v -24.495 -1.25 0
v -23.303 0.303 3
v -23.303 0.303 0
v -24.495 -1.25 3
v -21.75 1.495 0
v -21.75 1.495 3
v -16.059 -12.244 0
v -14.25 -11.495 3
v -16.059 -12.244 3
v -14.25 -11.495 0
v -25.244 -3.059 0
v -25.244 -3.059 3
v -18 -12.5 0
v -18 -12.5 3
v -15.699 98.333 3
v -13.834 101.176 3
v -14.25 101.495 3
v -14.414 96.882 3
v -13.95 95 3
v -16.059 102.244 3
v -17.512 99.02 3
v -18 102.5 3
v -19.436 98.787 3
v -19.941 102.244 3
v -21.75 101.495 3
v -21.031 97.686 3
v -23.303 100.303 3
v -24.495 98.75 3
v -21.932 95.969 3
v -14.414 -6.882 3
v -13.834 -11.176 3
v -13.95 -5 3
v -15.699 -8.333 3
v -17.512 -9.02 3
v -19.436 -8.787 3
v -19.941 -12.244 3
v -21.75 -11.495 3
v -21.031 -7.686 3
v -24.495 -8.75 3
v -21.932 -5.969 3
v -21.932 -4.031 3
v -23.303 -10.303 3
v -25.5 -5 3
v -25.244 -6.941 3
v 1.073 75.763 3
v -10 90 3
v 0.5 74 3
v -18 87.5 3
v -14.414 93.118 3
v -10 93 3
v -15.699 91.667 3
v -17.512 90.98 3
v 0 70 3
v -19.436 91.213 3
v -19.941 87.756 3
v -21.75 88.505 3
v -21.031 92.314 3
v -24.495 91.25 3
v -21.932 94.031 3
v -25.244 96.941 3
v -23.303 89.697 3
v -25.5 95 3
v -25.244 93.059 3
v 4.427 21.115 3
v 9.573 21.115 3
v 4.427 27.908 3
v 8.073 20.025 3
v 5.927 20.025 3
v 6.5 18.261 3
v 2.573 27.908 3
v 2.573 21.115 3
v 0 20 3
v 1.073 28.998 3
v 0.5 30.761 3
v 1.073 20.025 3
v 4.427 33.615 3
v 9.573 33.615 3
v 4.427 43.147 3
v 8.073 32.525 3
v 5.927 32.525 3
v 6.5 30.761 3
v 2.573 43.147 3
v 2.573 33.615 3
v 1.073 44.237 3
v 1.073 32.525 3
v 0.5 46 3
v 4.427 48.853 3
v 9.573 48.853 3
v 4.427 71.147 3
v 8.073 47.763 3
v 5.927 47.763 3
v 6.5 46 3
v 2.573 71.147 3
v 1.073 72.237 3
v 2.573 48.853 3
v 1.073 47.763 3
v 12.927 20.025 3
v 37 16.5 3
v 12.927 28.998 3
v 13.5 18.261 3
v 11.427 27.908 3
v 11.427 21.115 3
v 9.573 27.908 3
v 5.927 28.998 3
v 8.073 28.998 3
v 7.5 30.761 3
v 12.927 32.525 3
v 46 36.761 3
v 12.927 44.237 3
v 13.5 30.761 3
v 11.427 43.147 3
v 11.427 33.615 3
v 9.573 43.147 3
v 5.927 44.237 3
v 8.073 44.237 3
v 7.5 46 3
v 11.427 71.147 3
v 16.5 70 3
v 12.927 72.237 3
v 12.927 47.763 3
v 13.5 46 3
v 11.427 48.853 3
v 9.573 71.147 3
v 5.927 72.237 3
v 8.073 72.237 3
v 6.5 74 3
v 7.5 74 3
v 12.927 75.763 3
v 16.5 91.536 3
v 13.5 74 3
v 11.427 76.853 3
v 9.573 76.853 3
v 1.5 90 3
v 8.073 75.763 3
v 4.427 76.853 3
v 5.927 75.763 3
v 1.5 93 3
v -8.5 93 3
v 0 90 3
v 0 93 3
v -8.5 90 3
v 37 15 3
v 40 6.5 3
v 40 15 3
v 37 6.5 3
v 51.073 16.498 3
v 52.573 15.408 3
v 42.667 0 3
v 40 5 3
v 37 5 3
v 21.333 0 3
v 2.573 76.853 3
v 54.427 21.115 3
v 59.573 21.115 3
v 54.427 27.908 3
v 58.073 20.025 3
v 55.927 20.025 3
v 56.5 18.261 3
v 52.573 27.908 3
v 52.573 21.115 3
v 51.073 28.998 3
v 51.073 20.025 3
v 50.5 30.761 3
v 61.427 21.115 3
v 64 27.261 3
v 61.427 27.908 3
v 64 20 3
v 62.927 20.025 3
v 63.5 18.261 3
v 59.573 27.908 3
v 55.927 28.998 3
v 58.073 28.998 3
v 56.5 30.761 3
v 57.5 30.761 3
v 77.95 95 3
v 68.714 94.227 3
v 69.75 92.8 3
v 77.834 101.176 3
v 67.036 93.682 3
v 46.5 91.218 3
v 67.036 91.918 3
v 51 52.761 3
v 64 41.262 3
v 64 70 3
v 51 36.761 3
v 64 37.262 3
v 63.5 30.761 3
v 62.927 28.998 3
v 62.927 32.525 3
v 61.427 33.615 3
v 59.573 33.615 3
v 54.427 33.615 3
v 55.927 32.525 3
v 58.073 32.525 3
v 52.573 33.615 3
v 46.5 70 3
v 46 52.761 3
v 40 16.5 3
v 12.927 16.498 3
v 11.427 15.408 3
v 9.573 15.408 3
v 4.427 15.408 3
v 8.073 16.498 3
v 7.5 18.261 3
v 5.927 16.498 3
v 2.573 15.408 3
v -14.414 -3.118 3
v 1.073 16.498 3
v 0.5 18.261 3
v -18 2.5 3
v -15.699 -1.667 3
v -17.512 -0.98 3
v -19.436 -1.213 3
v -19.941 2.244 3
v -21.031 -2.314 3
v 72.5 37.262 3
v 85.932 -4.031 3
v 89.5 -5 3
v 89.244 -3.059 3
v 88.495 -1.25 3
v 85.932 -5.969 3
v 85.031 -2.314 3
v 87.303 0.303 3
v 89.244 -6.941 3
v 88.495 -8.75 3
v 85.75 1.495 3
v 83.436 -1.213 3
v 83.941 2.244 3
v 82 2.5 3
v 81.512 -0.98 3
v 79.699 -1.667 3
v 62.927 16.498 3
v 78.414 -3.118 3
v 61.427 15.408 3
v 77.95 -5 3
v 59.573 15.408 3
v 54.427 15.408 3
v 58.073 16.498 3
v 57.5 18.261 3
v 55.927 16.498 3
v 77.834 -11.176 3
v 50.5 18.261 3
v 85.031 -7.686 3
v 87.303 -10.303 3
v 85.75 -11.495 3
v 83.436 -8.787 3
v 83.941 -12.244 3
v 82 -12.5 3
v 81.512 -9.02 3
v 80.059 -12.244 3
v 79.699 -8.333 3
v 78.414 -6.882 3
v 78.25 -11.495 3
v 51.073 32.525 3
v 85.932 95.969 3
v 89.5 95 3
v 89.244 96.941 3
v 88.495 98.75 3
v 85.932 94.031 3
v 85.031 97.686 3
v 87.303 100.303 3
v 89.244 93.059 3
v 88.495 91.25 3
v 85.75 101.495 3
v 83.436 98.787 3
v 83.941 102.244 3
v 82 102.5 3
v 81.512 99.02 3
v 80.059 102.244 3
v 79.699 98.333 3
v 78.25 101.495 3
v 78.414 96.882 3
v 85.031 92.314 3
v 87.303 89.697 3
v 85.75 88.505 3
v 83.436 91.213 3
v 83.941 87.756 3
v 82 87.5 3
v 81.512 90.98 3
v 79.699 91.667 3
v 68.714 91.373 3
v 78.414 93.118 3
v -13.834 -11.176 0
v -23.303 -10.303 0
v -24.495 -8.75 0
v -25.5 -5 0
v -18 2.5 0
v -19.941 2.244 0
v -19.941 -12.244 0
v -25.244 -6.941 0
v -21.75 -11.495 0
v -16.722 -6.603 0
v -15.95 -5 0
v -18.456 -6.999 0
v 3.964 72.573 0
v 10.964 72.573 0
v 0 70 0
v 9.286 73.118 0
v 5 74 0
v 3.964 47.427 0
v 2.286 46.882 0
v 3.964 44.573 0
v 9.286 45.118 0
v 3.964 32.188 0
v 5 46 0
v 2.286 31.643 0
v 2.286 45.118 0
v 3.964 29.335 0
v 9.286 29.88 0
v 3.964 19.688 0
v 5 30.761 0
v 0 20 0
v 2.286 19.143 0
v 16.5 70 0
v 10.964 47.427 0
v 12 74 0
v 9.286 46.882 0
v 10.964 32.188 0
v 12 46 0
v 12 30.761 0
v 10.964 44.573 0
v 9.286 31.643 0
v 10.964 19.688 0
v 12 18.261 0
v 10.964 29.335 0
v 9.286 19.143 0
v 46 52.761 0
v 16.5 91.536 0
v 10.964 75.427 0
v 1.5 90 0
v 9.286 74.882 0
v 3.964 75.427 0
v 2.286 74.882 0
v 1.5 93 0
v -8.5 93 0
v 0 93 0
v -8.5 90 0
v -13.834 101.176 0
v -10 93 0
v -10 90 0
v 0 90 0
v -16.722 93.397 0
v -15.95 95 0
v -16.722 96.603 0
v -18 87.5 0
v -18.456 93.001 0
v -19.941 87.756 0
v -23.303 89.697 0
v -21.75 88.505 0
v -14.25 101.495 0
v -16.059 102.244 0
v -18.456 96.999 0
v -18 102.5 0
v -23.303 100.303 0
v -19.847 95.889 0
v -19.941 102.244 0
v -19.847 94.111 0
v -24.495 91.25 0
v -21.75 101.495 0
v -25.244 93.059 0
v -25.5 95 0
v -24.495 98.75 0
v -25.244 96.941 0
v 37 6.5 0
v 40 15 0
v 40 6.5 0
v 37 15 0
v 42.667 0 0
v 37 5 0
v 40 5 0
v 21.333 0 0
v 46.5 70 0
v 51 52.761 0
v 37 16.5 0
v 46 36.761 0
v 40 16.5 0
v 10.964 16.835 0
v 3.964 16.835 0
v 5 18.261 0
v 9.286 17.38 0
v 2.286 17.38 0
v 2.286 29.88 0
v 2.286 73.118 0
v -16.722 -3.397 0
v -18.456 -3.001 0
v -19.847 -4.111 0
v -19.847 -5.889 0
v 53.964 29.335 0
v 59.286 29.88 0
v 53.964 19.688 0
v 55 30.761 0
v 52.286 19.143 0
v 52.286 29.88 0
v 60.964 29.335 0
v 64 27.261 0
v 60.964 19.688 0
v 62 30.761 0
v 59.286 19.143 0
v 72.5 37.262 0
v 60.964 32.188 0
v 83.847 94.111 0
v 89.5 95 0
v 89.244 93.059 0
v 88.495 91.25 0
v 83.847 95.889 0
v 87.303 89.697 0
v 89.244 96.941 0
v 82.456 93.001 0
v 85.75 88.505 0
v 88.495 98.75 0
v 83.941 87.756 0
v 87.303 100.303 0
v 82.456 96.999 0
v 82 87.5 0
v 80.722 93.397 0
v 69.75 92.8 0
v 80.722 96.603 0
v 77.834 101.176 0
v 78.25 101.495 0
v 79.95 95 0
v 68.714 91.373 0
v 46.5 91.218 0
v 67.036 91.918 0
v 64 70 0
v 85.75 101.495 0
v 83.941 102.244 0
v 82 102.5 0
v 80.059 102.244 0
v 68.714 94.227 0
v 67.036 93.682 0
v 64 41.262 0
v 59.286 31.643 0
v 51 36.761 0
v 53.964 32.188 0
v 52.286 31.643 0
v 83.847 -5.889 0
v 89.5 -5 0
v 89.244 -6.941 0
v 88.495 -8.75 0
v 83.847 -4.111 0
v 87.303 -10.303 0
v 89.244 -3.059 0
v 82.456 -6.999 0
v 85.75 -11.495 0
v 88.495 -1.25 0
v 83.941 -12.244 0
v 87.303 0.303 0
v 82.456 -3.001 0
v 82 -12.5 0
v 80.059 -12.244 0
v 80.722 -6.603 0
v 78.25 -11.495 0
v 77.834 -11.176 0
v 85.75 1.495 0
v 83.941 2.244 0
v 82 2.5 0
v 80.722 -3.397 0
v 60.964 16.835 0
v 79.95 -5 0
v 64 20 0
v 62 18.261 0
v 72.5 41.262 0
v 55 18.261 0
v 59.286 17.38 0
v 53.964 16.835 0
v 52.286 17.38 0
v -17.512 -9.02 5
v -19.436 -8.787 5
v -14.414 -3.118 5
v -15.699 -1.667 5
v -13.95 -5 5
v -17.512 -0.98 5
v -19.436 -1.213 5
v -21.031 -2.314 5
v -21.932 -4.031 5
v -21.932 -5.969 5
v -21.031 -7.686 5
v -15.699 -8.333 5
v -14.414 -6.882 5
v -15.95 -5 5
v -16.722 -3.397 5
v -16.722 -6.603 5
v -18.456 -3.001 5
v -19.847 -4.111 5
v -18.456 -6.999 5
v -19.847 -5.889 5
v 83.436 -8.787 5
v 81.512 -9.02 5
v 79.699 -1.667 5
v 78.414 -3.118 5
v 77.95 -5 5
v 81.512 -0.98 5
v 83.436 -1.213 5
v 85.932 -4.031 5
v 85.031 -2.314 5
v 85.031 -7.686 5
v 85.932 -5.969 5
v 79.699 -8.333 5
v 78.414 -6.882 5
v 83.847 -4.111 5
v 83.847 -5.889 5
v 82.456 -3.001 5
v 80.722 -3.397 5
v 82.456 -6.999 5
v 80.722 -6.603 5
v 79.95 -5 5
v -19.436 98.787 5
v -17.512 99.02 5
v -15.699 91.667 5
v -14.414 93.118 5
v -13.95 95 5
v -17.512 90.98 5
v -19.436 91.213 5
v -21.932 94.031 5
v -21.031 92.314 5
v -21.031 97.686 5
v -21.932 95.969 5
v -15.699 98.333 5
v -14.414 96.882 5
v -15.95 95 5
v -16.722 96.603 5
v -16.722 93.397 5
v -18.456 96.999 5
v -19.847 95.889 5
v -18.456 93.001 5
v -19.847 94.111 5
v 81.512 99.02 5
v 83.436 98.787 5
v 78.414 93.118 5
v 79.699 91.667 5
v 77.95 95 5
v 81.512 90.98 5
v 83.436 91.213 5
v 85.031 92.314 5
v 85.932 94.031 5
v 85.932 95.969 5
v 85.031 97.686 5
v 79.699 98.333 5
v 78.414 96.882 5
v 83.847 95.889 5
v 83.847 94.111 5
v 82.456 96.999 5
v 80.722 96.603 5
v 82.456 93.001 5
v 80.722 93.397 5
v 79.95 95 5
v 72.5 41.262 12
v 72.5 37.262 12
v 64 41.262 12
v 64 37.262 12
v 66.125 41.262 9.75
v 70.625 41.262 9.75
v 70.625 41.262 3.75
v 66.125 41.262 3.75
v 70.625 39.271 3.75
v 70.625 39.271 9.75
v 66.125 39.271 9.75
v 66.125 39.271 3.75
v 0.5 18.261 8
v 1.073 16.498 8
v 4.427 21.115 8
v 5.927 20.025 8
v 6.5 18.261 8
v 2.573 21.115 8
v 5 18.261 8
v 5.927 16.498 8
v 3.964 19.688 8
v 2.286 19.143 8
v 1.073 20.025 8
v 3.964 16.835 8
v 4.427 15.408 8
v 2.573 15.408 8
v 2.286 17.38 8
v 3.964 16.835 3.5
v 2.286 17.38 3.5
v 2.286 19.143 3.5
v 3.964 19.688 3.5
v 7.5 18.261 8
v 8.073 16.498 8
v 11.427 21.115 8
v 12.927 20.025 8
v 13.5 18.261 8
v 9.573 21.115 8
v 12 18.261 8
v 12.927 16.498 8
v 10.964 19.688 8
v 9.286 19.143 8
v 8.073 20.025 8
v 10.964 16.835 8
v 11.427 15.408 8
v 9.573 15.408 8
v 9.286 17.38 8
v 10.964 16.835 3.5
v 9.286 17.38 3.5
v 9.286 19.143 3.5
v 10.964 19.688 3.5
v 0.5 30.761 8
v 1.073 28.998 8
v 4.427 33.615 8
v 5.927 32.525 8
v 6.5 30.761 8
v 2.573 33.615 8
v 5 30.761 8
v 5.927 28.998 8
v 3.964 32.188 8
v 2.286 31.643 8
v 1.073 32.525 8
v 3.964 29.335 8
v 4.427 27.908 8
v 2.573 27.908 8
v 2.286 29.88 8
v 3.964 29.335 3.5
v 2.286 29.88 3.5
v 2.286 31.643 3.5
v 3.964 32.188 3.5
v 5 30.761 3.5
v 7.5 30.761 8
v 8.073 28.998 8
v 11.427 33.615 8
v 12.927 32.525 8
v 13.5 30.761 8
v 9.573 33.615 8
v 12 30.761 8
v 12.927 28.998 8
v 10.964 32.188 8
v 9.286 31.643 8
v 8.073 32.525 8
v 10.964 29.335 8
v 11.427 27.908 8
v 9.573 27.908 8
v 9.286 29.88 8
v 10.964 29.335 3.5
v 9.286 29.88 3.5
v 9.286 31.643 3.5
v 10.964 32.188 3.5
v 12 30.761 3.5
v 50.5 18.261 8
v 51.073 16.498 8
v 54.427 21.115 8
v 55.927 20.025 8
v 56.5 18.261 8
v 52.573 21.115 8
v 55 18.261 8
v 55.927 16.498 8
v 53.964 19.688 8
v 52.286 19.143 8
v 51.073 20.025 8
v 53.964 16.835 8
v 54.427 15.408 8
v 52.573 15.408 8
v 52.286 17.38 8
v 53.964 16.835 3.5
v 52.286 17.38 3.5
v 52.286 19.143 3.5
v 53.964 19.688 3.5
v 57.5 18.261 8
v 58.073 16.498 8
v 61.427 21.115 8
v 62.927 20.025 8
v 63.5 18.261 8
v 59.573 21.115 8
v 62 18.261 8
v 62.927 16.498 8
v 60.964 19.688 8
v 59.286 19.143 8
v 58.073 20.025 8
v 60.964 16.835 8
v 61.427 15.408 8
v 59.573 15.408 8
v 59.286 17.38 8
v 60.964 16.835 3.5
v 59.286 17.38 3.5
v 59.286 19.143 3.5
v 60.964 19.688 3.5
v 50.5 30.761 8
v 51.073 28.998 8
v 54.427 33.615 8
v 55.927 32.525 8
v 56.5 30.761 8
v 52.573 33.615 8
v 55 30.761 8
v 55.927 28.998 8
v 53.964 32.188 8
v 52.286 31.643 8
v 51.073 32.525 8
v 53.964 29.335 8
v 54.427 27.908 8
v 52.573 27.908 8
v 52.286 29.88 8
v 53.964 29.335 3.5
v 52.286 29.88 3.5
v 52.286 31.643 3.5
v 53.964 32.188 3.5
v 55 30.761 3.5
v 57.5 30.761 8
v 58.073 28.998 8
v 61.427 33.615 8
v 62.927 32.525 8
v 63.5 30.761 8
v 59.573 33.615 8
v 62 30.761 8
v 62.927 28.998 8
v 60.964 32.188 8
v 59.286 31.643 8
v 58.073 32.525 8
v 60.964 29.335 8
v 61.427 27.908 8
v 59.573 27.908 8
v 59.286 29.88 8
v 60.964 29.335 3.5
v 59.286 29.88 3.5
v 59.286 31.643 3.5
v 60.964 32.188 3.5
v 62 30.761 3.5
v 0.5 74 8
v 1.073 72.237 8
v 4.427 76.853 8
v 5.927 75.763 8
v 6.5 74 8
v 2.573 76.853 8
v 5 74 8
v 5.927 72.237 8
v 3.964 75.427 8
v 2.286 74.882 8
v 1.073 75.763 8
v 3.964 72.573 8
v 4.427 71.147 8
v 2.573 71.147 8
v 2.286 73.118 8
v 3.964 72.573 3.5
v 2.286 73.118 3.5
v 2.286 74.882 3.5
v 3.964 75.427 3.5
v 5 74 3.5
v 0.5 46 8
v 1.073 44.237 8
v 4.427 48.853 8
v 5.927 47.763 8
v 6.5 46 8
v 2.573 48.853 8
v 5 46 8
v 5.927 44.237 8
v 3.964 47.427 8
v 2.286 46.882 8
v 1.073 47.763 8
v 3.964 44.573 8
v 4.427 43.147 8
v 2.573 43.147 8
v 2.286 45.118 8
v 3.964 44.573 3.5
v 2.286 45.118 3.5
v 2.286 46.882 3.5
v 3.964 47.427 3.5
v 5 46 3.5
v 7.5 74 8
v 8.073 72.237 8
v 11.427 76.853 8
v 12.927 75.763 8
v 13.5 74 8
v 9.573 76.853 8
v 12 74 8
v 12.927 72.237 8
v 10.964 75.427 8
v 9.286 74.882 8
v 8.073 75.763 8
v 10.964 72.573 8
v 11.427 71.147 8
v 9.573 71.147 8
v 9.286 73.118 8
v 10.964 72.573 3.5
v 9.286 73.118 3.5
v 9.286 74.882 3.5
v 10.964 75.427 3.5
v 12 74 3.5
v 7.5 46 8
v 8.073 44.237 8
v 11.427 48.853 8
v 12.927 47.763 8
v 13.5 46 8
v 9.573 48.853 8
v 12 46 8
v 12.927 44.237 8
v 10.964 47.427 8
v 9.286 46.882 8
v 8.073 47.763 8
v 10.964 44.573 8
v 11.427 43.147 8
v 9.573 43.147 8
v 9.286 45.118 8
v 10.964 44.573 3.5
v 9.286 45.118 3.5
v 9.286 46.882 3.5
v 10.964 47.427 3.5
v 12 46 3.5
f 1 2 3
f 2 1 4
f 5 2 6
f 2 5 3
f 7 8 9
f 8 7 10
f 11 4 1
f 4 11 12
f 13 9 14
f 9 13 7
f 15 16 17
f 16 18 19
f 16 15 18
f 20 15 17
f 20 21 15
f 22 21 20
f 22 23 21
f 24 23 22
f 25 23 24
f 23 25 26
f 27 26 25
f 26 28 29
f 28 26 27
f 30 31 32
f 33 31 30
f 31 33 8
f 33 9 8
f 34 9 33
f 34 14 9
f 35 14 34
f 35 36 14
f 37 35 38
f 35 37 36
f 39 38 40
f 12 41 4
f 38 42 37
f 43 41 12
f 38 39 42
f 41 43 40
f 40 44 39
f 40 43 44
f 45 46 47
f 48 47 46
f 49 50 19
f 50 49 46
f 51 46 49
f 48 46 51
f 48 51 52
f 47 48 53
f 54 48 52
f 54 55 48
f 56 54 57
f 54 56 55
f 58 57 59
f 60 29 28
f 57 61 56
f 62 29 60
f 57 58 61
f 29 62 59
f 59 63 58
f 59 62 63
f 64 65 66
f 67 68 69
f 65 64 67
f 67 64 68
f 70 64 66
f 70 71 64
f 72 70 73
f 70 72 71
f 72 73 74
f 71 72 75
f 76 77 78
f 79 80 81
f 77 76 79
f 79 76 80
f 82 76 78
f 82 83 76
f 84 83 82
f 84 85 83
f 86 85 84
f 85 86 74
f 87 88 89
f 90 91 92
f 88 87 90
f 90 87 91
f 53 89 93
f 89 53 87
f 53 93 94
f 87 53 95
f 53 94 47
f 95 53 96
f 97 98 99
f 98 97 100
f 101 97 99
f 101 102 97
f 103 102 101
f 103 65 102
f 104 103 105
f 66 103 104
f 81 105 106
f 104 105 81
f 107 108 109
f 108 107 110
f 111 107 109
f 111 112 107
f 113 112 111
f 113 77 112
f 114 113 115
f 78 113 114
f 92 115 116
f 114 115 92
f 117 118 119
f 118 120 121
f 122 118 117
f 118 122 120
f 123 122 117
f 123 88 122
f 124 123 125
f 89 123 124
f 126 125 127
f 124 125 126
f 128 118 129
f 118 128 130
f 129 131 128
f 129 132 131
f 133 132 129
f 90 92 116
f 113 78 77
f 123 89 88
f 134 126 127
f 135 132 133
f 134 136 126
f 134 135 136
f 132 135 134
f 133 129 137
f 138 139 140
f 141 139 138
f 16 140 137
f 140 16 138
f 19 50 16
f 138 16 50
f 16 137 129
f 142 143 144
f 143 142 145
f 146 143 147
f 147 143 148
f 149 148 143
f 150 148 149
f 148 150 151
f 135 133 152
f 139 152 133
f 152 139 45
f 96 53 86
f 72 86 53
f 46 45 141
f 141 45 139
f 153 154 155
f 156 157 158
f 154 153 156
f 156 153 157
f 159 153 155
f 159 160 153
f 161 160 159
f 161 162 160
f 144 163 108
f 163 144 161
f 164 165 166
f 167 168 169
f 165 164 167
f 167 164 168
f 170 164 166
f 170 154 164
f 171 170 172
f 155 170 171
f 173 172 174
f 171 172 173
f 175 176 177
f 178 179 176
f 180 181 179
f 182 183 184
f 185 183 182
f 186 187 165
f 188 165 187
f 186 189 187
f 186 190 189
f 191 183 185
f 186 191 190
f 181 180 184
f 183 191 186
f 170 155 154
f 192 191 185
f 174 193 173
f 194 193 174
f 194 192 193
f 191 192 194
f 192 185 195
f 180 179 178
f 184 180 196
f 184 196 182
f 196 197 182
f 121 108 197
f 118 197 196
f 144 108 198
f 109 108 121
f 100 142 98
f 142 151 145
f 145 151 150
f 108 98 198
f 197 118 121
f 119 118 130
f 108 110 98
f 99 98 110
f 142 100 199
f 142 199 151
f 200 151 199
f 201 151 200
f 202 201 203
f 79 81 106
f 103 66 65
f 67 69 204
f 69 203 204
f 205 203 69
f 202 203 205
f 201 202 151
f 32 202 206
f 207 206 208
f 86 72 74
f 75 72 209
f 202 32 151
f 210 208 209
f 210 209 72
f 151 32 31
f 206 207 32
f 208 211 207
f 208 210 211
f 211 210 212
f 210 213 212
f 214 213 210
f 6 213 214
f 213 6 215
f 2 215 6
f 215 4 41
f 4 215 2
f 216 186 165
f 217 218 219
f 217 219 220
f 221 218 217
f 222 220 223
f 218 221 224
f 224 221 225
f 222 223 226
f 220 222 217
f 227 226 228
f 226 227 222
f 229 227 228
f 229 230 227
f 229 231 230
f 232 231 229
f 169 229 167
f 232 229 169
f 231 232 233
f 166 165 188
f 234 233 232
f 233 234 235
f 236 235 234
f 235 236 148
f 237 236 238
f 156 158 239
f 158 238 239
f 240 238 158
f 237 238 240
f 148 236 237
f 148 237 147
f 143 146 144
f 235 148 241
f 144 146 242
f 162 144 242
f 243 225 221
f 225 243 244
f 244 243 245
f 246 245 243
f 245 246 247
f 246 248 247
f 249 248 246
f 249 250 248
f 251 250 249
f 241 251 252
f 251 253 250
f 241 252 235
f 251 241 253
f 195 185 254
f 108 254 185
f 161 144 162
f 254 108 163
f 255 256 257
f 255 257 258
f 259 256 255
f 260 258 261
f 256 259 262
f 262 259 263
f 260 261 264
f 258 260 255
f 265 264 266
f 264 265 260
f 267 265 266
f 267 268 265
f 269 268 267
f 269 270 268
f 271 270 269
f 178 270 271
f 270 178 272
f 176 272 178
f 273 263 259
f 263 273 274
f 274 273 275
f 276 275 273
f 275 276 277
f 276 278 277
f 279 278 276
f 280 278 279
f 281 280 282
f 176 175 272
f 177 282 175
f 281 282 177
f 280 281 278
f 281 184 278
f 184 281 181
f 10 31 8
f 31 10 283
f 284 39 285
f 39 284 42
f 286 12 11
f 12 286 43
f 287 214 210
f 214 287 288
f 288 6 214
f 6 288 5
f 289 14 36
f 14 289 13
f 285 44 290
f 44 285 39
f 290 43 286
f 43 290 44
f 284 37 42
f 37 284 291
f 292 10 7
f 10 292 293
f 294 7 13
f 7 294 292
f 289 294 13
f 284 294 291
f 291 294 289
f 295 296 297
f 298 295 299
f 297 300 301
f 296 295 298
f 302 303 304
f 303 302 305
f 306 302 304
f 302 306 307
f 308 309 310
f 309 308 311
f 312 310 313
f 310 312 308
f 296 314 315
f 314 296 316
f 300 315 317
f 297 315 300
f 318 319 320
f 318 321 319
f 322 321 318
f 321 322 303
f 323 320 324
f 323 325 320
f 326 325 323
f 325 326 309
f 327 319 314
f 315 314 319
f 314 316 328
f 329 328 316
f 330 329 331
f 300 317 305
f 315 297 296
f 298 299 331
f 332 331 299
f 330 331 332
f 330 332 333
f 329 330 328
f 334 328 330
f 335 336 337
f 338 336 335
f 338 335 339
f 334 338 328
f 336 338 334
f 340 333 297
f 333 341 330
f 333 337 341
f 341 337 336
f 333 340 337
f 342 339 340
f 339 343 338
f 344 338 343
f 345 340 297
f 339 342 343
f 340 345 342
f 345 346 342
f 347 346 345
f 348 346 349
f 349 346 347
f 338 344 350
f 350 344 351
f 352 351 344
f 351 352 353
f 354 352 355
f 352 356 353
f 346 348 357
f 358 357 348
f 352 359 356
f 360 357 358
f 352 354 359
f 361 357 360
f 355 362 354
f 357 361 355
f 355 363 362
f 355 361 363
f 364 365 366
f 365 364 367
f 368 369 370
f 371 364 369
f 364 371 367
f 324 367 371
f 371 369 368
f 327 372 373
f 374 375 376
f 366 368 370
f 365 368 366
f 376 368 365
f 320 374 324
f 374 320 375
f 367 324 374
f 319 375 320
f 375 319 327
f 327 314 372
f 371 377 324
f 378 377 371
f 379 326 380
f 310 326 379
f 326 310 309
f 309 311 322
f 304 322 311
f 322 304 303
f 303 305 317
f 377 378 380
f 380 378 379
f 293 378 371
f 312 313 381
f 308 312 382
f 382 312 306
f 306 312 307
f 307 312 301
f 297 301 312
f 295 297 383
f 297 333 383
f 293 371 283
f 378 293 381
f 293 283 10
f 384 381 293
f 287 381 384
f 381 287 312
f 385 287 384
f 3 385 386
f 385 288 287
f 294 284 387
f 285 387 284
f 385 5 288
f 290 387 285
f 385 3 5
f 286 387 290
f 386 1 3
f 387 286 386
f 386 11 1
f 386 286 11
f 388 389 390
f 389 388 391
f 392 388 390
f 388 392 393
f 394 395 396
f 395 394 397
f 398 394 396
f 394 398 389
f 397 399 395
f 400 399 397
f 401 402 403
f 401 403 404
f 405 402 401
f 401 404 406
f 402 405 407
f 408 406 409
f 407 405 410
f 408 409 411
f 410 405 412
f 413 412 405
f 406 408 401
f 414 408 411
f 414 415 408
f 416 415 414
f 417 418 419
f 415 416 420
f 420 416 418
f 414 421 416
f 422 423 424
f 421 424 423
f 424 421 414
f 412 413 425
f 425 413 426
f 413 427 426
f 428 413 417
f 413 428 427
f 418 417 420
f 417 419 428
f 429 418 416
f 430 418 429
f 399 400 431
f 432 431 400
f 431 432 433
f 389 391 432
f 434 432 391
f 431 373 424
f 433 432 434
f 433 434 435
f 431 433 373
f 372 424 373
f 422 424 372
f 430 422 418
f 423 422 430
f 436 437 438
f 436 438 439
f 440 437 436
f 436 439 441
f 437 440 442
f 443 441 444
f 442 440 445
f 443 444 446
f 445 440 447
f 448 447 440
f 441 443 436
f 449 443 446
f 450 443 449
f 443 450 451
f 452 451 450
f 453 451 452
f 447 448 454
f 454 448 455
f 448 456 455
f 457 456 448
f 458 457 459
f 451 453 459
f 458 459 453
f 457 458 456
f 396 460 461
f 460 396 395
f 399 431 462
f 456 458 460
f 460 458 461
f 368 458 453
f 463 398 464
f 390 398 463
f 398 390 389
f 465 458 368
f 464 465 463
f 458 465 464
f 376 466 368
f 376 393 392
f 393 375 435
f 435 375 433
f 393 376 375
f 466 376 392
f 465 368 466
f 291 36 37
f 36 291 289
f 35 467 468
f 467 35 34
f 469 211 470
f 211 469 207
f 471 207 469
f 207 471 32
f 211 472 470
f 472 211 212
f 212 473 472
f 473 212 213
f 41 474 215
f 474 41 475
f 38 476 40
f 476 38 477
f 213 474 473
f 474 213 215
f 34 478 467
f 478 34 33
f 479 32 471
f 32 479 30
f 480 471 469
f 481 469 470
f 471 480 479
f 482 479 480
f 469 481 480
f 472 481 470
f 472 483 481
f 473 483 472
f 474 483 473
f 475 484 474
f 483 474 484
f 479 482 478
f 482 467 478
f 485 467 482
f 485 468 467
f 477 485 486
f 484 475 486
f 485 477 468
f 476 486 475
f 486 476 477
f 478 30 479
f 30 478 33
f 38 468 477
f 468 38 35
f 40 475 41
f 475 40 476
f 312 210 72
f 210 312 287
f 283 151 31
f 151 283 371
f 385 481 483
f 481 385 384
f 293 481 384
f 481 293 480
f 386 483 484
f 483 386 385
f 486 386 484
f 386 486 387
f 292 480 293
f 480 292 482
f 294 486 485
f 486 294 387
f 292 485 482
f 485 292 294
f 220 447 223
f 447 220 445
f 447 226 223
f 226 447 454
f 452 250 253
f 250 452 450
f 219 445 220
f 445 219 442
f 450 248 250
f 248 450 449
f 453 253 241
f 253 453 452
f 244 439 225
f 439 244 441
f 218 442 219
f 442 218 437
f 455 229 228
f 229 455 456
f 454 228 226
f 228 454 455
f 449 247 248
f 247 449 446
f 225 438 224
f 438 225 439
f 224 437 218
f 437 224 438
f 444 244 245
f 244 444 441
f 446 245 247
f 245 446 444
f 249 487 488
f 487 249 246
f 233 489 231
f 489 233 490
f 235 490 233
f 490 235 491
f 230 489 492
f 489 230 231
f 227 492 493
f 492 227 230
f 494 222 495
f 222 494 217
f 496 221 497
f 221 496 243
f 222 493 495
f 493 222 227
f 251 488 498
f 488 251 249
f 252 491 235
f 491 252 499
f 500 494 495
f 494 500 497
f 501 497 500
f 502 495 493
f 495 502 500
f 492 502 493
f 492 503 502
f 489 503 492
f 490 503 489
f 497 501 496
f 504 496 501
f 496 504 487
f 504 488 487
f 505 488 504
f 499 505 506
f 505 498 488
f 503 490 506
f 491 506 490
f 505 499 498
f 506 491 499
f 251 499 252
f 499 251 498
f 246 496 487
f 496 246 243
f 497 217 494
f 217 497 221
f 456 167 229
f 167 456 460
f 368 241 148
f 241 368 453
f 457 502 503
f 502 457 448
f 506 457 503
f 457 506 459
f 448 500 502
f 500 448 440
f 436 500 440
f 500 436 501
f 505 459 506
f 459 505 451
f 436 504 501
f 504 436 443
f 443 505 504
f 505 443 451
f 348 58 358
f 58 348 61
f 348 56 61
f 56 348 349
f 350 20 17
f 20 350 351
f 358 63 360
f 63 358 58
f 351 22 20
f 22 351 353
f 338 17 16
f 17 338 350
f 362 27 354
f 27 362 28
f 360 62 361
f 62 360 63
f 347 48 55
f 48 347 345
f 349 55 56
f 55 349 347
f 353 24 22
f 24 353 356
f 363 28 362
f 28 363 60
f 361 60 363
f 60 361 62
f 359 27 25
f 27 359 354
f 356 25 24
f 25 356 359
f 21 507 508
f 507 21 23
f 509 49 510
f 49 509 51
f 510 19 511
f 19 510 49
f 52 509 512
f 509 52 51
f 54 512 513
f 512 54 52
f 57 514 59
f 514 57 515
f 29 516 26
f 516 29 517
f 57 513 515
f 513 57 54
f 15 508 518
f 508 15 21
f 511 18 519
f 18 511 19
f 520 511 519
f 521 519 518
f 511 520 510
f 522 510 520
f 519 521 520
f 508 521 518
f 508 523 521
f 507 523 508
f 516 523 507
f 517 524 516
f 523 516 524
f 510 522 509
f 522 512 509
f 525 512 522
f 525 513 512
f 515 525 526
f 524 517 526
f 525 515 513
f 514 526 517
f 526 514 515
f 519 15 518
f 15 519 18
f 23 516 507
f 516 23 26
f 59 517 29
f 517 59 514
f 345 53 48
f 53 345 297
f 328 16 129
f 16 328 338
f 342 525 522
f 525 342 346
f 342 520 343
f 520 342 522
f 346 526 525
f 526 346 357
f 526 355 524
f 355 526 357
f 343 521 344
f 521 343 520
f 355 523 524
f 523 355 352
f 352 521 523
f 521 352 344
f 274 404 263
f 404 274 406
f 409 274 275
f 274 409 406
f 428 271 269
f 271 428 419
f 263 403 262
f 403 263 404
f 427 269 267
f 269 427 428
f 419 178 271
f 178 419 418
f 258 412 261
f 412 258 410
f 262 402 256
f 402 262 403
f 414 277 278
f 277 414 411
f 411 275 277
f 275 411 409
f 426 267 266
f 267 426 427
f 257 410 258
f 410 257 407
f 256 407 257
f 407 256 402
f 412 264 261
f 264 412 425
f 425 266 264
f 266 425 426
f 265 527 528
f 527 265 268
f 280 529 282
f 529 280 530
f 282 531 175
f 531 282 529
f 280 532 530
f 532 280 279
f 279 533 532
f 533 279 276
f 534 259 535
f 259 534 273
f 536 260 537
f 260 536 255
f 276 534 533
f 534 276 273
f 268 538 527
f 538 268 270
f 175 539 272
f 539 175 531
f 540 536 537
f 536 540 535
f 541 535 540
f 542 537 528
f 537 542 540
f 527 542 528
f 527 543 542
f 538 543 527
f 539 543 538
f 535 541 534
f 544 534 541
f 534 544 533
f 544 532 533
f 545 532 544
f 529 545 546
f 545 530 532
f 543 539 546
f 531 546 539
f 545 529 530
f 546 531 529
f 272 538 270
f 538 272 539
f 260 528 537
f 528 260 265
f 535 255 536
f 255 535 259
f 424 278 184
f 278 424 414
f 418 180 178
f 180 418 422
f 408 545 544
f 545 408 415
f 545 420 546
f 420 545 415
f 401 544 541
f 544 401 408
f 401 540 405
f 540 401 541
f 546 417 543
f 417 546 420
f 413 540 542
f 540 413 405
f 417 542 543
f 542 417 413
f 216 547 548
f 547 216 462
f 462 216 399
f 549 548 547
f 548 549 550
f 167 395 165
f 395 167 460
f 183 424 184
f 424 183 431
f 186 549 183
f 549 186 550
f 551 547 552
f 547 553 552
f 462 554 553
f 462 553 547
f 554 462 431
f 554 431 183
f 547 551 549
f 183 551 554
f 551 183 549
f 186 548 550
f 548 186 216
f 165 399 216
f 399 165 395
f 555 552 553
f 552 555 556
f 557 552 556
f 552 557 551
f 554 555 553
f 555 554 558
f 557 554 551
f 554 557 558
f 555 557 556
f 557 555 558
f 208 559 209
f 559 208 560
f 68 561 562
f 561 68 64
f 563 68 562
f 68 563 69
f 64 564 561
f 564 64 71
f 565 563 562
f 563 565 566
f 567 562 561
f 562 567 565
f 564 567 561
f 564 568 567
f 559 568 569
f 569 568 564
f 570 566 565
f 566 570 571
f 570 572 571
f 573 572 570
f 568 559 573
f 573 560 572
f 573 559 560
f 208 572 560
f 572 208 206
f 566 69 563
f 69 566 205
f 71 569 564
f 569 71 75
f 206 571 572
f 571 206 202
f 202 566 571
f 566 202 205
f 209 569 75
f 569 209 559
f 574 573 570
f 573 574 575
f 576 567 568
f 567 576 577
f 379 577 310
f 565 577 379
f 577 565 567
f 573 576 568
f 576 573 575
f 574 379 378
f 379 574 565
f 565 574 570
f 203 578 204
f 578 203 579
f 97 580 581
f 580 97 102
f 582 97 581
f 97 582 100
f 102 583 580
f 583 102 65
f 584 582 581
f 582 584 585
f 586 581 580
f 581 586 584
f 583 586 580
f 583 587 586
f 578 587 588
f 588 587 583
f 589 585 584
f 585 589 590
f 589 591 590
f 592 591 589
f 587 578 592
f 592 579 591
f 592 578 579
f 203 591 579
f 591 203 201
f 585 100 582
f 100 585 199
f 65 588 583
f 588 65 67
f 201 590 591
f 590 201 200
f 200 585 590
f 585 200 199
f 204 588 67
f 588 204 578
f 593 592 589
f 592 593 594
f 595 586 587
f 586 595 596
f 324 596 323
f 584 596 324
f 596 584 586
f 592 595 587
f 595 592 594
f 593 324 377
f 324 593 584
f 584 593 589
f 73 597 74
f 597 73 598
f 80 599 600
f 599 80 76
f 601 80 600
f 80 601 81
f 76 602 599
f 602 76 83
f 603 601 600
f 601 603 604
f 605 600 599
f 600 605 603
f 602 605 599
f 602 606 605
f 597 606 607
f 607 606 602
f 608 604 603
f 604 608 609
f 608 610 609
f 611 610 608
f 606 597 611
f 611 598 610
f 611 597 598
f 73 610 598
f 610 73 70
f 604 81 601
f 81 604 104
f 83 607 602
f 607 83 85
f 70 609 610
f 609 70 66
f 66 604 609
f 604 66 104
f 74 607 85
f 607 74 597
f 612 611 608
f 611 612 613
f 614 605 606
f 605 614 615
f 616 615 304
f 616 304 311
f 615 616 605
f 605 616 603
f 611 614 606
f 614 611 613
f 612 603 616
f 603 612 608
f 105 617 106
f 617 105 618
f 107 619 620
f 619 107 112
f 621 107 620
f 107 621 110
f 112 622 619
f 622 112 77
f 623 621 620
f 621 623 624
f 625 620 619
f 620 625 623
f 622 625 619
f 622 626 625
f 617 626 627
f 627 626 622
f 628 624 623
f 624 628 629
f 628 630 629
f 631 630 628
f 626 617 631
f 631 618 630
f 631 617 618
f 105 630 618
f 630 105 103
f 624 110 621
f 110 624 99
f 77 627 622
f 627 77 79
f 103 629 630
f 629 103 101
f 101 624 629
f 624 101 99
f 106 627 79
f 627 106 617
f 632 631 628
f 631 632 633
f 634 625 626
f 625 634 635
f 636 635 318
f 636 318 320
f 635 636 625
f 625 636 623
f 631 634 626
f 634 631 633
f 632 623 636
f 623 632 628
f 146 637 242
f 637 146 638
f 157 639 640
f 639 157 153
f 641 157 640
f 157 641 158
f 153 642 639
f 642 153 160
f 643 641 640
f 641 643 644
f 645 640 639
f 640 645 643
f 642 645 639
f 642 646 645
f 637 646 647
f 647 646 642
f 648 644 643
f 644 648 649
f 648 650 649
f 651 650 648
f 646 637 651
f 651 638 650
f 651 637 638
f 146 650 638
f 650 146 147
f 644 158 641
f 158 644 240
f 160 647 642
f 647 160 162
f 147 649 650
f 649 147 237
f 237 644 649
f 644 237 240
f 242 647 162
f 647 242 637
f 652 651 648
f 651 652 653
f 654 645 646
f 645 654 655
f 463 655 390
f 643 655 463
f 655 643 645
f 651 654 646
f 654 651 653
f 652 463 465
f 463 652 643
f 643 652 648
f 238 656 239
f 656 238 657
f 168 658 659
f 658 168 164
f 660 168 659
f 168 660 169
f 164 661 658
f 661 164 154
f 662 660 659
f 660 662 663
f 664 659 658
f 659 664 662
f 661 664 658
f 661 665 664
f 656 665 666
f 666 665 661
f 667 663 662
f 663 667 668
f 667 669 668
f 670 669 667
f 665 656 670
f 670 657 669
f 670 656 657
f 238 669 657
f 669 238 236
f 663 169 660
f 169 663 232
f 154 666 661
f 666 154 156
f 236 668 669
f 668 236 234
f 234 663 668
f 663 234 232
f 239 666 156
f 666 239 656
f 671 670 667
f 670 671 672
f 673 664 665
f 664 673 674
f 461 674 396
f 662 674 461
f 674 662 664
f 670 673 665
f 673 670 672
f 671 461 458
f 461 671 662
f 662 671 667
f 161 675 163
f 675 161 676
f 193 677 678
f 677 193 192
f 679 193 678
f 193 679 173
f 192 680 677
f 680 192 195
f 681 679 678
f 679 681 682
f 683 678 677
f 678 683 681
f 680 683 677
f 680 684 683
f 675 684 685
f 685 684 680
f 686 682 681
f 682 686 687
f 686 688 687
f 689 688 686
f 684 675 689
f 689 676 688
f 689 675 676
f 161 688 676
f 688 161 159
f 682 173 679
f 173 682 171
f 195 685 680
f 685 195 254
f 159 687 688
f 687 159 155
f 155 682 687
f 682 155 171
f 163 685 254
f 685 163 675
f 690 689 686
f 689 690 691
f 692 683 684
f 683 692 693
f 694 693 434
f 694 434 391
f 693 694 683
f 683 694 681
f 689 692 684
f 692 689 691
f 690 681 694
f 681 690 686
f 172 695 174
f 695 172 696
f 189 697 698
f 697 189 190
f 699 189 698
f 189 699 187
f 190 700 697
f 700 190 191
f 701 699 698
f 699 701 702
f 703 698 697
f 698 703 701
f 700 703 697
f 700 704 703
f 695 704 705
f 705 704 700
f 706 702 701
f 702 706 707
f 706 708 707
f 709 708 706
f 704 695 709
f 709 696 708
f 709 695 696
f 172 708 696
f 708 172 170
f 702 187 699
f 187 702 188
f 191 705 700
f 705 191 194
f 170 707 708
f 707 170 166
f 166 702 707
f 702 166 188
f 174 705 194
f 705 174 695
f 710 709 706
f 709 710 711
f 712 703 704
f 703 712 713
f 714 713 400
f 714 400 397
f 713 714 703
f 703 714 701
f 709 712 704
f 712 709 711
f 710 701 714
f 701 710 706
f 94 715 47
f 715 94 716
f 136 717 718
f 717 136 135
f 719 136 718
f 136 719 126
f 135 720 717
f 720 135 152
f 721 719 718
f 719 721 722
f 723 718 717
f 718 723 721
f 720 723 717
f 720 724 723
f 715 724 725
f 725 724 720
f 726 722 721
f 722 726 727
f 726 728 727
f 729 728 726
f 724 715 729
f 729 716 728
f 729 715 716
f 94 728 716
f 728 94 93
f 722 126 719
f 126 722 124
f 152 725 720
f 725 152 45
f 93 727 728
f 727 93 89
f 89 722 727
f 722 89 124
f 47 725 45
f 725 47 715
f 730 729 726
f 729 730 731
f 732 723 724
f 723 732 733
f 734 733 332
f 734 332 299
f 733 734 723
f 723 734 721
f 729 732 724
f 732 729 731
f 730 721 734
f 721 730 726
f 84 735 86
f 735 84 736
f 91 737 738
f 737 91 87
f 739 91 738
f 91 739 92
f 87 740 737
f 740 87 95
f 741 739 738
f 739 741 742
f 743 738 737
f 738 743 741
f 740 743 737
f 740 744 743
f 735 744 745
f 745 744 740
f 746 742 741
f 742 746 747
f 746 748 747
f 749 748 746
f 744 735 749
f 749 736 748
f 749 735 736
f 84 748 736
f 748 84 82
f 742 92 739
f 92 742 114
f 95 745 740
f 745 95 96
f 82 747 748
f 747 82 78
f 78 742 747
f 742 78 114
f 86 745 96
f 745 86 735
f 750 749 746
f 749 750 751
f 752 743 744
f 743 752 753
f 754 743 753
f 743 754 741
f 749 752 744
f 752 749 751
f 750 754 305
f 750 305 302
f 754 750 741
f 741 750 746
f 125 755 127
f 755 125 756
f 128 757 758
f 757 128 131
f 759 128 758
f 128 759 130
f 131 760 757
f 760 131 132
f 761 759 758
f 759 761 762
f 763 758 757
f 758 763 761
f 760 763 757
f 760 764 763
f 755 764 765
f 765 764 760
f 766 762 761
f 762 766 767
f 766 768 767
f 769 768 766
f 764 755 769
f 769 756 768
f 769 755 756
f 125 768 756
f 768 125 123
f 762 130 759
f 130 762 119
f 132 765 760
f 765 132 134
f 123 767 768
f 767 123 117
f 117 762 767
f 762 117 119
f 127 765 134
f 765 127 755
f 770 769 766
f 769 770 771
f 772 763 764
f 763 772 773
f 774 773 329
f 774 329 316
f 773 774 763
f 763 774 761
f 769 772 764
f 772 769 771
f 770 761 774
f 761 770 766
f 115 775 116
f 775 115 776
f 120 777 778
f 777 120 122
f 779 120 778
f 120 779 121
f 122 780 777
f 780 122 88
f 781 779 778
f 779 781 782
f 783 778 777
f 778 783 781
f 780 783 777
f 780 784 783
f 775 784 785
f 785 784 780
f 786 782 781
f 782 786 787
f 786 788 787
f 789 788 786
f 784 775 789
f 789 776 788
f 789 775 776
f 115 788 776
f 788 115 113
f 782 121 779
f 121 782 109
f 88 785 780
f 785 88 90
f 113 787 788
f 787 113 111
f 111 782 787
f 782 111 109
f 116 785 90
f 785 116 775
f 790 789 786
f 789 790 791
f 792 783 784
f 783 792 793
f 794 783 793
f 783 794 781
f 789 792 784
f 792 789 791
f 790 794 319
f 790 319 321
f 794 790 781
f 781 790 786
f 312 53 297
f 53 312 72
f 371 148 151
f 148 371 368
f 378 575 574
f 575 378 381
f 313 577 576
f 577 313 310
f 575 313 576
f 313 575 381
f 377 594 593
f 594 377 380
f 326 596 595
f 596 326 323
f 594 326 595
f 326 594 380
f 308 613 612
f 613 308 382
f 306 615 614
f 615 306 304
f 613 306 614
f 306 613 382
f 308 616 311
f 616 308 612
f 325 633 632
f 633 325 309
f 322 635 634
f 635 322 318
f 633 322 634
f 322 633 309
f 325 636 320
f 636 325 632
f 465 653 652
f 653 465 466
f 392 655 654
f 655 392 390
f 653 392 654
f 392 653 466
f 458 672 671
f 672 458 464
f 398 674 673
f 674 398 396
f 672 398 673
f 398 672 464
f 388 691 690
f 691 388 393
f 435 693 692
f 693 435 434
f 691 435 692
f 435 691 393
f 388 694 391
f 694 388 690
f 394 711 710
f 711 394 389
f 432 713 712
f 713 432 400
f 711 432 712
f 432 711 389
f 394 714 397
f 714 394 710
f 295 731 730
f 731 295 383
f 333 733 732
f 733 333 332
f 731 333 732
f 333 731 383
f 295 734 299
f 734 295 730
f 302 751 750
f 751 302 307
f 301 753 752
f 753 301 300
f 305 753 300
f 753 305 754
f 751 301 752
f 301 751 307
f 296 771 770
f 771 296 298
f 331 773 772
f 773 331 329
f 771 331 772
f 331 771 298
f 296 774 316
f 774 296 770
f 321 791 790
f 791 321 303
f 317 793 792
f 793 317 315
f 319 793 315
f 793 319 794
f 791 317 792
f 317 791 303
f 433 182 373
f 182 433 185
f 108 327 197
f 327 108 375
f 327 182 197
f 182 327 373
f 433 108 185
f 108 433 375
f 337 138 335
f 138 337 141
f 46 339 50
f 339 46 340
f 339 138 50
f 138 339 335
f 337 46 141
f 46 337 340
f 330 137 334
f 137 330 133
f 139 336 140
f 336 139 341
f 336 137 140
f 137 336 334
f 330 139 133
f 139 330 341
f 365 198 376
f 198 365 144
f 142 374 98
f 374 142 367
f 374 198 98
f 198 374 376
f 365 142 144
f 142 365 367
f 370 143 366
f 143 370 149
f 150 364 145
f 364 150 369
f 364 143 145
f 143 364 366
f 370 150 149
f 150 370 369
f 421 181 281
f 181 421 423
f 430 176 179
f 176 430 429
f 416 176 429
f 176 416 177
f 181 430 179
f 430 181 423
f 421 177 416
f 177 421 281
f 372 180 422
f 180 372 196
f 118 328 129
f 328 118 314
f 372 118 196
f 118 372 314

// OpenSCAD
// Mounting holes are 10cm apart along X and Y
mounting_holes_x_distance=100;
mounting_holes_y_distance=100;

// Mounting hole radii
m4_hole_radius=2.05;
m3_hole_radius=1.5;
mount_support_radius=m3_hole_radius+1.5;

// Height above backplate of supporting holes for the axle mounts and the ring gear base mount
mount_support_height=5;

// Height of screw holes for the suction cups
mounting_hole_height=5;

// Curvature of the ends of the mounting protrusions
mounting_web_radius=7.5;

backplate_thickness=3;
backplate_width=64;
backplate_height=90;

// Variables from full_assembly.scad
distance_between_gears=29.0385+0.15+0.05;
gearbox_z_offset=60;
gearbox_x_offset=0;

// Variables from front_axle_mount.scad
axle_mount_thickness=14;
root_height=25;

// Mounting protrusion
module mounting_web() {
    difference() {
        union() {
            // round tip of the mounting protrusion
            cylinder(h=backplate_thickness, r=mounting_web_radius);
            // extra height for the screw hole
            cylinder(h=mounting_hole_height, r=m4_hole_radius+2);
            // polygon which forms the web (connects the tip to the main rectangle)
            linear_extrude(backplate_thickness, center = false, convexity = 4) {
                // polygon points
                p1=[0,-mounting_web_radius];
                p2=[backplate_width/3-backplate_width/2+mounting_holes_x_distance/2,
                    -backplate_height/2+mounting_holes_y_distance/2];
                p3=[-backplate_width/2+mounting_holes_x_distance/2,
                    backplate_height/3+backplate_height/2-mounting_holes_y_distance/2];
                p4=[0,mounting_web_radius];
                polygon([p1,p2,p3,p4]);
            }
        }
        // cutout for the mounting hole
        translate([0,0,-0.5]) cylinder(h=mounting_hole_height+1, r=m4_hole_radius);
    }
}
//translate([backplate_width/2-mounting_holes_x_distance/2,backplate_height/2-mounting_holes_y_distance/2,0]) mounting_web();

module m3_hole_support() {
    color("Crimson", 0.9)
    difference() {
        // main body
        cylinder(h=backplate_thickness+mount_support_height, r=mount_support_radius);
        // cutout m3 hole
        translate([0,0,-0.5]) cylinder(h=backplate_thickness+5+1, r=m3_hole_radius);
    }
}
//m3_hole_support();

module axle_mount_hole_supports() {
    translate([axle_mount_thickness/4,0,0]) m3_hole_support();
    translate([axle_mount_thickness*3/4,0,0]) m3_hole_support();
    translate([axle_mount_thickness/4,root_height/2,0]) m3_hole_support();
    translate([axle_mount_thickness*3/4,root_height/2,0]) m3_hole_support();
}
//axle_mount_hole_supports();

module axle_mount_holes() {
    translate([axle_mount_thickness/4,0,-0.5]) cylinder(h=backplate_thickness+1, r=m3_hole_radius);
    translate([axle_mount_thickness*3/4,0,-0.5]) cylinder(h=backplate_thickness+1, r=m3_hole_radius);
    translate([axle_mount_thickness/4,root_height/2,-0.5]) cylinder(h=backplate_thickness+1, r=m3_hole_radius);
    translate([axle_mount_thickness*3/4,root_height/2,-0.5]) cylinder(h=backplate_thickness+1, r=m3_hole_radius);
}
//axle_mount_holes();

module ring_gear_base_mount_hole_supports() {
    translate([14/4,14,0]) m3_hole_support();
    translate([14/4,-14,0]) m3_hole_support();
    translate([14*3/4,14,0]) m3_hole_support();
    translate([14*3/4,-14,0]) m3_hole_support();
}
//ring_gear_base_mount_hole_supports();

module ring_gear_base_mount_holes() {
    translate([14/4,14,-0.5]) cylinder(h=backplate_thickness+1, r=m3_hole_radius);
    translate([14/4,-14,-0.5]) cylinder(h=backplate_thickness+1, r=m3_hole_radius);
    translate([14*3/4,14,-0.5]) cylinder(h=backplate_thickness+1, r=m3_hole_radius);
    translate([14*3/4,-14,-0.5]) cylinder(h=backplate_thickness+1, r=m3_hole_radius);
}
//ring_gear_base_mount_holes();

module backplate() {
    color("Indigo",0.6) 
    difference() {
        union() {
            // 4 mounting webs
            translate([backplate_width/2-mounting_holes_x_distance/2,backplate_height/2-mounting_holes_y_distance/2,0])
                mounting_web();
            translate([backplate_width/2+mounting_holes_x_distance/2,backplate_height/2-mounting_holes_y_distance/2,0])
                mirror([1,0,0]) mounting_web();
            translate([backplate_width/2-mounting_holes_x_distance/2,backplate_height/2+mounting_holes_y_distance/2,0])
                mirror([0,1,0]) mounting_web();
            translate([backplate_width/2+mounting_holes_x_distance/2,backplate_height/2+mounting_holes_y_distance/2,0])
                mirror([0,1,0]) mirror([1,0,0]) mounting_web();
            // main rectangle
            cube([backplate_width,backplate_height,backplate_thickness]);
            // bottom latch for the power distribution mini-breadboard
            translate([backplate_width,30.7615+6+0.5,0]) 
            difference() {
                union() {
                    // main latch body
                    cube([8.5,4,9+backplate_thickness]);
                    // small triangular support
                    linear_extrude(backplate_thickness, center = false, convexity = 4) {
                        points=[[8.5,0],[0,-10],[0,0]];
                        polygon(points);
                    }
                }
                // square hole cutout to hold the mini-breadboard by the notch
                translate([8.5/4,2.01,backplate_thickness+0.75]) cube([4.5,2,6]);
            }
            // m3 mounting supports for front axle mount
            translate([gearbox_x_offset+0,gearbox_z_offset-distance_between_gears-root_height/2,0]) 
                axle_mount_hole_supports();
            // m3 mounting supports for rear axle mount
            translate([gearbox_x_offset+50,gearbox_z_offset-distance_between_gears-root_height/2,0]) 
                axle_mount_hole_supports();
            // m3 mounting supports for the ring gear base mount (gearbox)
            translate([gearbox_x_offset,gearbox_z_offset,0]) 
                ring_gear_base_mount_hole_supports();
        }
        // hole for the power cables from the battery, and for the 6 wires going to the stepper driver board
        translate([backplate_width-12-6,30.7615+6,-0.5]) cube([5,16,backplate_height+1]);
        // parallel holes for ziptie cable management on top left web
        translate([-10,backplate_height-0,-0.5]) cube([1.5,3,backplate_thickness+1]);
        translate([0,backplate_height-0,-0.5]) cube([1.5,3,backplate_thickness+1]);
        // parallel holes for ziptie cable management in bottom center
        translate([backplate_width/2+5,15,-0.5]) cube([3,1.5,backplate_thickness+1]);
        translate([backplate_width/2+5,5,-0.5]) cube([3,1.5,backplate_thickness+1]);
        // m3 mounting holes for front axle mount
        translate([gearbox_x_offset+0,gearbox_z_offset-distance_between_gears-root_height/2,0]) 
            axle_mount_holes();
        // m3 mounting holes for rear axle mount
        translate([gearbox_x_offset+50,gearbox_z_offset-distance_between_gears-root_height/2,0])
            axle_mount_holes();
        // m3 mounting holes for the ring gear base mount (gearbox)
        translate([gearbox_x_offset,gearbox_z_offset,0]) 
            ring_gear_base_mount_holes();
        // m3 mounting hole for the mini-breadboard mounting bracket
        translate([64-(10-8.5)/2+5, 41.3+46.5+5, -0.5])
            cylinder(h=backplate_thickness+1, r=m3_hole_radius);
        // cutout for the main arm, so it can swing back beyond 3 degrees
        translate([18.5-2, backplate_height-20, -0.5]) cube([30,30,backplate_thickness+1]);
        
    }
}

backplate();







// Guides for the mounting holes
/*
translate([backplate_width/2-mounting_holes_x_distance/2,backplate_height/2-mounting_holes_y_distance/2,0]) 
    cylinder(h=backplate_thickness, r=m4_hole_radius);
translate([backplate_width/2+mounting_holes_x_distance/2,backplate_height/2-mounting_holes_y_distance/2,0]) 
    cylinder(h=backplate_thickness, r=m4_hole_radius);
translate([backplate_width/2-mounting_holes_x_distance/2,backplate_height/2+mounting_holes_y_distance/2,0]) 
    cylinder(h=backplate_thickness, r=m4_hole_radius);
translate([backplate_width/2+mounting_holes_x_distance/2,backplate_height/2+mounting_holes_y_distance/2,0]) 
    cylinder(h=backplate_thickness, r=m4_hole_radius);
*/
